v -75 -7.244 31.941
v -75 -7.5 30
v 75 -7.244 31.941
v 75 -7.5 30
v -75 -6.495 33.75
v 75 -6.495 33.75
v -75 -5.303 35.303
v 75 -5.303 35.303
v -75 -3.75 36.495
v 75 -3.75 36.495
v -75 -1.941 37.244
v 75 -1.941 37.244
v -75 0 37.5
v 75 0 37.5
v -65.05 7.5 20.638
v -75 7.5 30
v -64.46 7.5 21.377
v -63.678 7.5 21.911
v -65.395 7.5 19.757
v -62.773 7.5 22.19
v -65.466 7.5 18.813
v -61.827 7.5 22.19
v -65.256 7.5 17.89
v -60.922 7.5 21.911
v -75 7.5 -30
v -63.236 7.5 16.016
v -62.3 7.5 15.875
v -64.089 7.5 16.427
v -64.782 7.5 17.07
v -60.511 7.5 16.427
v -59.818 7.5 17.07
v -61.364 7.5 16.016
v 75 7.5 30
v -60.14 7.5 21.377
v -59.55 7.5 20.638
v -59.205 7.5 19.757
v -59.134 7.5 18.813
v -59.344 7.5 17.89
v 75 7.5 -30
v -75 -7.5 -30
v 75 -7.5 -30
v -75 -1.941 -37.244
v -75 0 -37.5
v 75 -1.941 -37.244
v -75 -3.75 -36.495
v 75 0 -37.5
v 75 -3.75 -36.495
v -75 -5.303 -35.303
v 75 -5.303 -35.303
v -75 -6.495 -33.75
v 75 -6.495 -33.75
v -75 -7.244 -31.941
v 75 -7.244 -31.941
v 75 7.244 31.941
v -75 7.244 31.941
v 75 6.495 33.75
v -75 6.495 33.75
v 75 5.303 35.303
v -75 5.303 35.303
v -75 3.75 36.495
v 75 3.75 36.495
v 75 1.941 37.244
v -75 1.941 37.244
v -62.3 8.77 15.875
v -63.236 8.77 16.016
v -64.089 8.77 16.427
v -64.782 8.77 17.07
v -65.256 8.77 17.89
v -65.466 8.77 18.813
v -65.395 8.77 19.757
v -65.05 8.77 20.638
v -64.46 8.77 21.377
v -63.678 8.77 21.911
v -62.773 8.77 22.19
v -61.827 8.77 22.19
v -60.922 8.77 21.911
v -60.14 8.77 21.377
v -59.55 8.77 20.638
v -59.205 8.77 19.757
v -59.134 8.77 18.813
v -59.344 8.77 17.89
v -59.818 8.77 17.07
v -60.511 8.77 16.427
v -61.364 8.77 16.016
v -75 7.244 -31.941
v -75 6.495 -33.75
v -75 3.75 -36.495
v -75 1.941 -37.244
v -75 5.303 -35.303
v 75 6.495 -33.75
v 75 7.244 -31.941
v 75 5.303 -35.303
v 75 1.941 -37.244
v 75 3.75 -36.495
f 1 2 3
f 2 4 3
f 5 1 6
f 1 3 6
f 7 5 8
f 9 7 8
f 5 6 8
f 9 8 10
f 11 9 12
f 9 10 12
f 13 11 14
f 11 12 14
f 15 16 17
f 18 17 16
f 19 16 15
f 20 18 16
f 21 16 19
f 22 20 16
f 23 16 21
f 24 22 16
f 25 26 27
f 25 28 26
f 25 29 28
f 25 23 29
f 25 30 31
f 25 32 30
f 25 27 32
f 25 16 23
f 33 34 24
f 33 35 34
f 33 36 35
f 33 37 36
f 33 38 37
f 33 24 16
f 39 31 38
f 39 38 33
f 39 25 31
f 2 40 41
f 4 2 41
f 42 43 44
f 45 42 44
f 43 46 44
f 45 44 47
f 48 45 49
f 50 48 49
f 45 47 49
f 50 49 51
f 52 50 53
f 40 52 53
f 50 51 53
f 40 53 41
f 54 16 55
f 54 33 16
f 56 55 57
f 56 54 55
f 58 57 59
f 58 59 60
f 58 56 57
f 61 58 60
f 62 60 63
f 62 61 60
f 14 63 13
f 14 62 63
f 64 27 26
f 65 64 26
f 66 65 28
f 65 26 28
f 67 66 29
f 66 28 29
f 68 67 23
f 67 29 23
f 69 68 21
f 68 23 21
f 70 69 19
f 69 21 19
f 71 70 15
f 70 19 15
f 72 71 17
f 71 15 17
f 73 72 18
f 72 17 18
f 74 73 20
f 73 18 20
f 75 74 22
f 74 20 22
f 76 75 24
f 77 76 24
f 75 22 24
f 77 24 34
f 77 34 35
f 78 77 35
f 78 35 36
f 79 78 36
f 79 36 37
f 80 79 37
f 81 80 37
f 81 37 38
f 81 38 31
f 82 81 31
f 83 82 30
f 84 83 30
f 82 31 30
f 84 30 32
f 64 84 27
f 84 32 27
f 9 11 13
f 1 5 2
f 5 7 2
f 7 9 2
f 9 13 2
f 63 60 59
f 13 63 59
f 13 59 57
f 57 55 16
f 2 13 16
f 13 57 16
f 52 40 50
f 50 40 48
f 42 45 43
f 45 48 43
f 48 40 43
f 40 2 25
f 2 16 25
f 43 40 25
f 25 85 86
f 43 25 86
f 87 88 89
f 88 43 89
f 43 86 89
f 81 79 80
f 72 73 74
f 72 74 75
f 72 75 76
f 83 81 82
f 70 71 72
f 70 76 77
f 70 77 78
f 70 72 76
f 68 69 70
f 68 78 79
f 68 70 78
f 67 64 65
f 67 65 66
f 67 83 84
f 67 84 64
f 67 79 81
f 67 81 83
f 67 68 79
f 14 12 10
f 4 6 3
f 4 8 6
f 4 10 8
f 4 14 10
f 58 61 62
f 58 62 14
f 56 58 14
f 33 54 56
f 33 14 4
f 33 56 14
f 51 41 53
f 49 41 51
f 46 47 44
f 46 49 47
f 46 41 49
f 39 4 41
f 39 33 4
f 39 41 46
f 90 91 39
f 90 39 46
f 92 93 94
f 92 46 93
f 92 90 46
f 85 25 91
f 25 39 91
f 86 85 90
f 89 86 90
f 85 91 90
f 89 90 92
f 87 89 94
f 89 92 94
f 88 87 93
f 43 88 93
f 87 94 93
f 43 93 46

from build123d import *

# Parameters (mm, degrees)
SKETCH1_W           = 150
SKETCH1_H           = 75
BOSS_EXTRUDE1_DEPTH = 7.5
FILLET1_R           = 7.5
SKETCH2_R           = 3.175
BOSS_EXTRUDE2_DEPTH = 1.27


with BuildPart() as part:
    # Sketch1 → Boss-Extrude1 (new, symmetric)
    with BuildSketch(Plane(origin=(0, 0, 0), x_dir=(1, 0, 0), z_dir=(0, 1, 0))):
        Rectangle(SKETCH1_W, SKETCH1_H)
    extrude(amount=BOSS_EXTRUDE1_DEPTH, both=True)

    # Fillet1
    fillet1_edges = [part.edges().sort_by_distance(p)[0] for p in [
        (0, -7.5, -37.5),
        (0, 7.5, -37.5),
        (0, -7.5, 37.5),
        (0, 7.5, 37.5),
    ]]
    fillet(fillet1_edges, radius=FILLET1_R - 0.0001)  # a hair under: the kernel refuses the full size

    # Sketch2 → Boss-Extrude2 (add)
    with BuildSketch(Plane(origin=(0, 7.5, 0), x_dir=(1, 0, 0), z_dir=(0, 1, 0))):
        with Locations(Location((-62.3, -19.05, 0), (0, 0, 90))):
            Circle(SKETCH2_R)
    extrude(amount=BOSS_EXTRUDE2_DEPTH)


solid = part.part
